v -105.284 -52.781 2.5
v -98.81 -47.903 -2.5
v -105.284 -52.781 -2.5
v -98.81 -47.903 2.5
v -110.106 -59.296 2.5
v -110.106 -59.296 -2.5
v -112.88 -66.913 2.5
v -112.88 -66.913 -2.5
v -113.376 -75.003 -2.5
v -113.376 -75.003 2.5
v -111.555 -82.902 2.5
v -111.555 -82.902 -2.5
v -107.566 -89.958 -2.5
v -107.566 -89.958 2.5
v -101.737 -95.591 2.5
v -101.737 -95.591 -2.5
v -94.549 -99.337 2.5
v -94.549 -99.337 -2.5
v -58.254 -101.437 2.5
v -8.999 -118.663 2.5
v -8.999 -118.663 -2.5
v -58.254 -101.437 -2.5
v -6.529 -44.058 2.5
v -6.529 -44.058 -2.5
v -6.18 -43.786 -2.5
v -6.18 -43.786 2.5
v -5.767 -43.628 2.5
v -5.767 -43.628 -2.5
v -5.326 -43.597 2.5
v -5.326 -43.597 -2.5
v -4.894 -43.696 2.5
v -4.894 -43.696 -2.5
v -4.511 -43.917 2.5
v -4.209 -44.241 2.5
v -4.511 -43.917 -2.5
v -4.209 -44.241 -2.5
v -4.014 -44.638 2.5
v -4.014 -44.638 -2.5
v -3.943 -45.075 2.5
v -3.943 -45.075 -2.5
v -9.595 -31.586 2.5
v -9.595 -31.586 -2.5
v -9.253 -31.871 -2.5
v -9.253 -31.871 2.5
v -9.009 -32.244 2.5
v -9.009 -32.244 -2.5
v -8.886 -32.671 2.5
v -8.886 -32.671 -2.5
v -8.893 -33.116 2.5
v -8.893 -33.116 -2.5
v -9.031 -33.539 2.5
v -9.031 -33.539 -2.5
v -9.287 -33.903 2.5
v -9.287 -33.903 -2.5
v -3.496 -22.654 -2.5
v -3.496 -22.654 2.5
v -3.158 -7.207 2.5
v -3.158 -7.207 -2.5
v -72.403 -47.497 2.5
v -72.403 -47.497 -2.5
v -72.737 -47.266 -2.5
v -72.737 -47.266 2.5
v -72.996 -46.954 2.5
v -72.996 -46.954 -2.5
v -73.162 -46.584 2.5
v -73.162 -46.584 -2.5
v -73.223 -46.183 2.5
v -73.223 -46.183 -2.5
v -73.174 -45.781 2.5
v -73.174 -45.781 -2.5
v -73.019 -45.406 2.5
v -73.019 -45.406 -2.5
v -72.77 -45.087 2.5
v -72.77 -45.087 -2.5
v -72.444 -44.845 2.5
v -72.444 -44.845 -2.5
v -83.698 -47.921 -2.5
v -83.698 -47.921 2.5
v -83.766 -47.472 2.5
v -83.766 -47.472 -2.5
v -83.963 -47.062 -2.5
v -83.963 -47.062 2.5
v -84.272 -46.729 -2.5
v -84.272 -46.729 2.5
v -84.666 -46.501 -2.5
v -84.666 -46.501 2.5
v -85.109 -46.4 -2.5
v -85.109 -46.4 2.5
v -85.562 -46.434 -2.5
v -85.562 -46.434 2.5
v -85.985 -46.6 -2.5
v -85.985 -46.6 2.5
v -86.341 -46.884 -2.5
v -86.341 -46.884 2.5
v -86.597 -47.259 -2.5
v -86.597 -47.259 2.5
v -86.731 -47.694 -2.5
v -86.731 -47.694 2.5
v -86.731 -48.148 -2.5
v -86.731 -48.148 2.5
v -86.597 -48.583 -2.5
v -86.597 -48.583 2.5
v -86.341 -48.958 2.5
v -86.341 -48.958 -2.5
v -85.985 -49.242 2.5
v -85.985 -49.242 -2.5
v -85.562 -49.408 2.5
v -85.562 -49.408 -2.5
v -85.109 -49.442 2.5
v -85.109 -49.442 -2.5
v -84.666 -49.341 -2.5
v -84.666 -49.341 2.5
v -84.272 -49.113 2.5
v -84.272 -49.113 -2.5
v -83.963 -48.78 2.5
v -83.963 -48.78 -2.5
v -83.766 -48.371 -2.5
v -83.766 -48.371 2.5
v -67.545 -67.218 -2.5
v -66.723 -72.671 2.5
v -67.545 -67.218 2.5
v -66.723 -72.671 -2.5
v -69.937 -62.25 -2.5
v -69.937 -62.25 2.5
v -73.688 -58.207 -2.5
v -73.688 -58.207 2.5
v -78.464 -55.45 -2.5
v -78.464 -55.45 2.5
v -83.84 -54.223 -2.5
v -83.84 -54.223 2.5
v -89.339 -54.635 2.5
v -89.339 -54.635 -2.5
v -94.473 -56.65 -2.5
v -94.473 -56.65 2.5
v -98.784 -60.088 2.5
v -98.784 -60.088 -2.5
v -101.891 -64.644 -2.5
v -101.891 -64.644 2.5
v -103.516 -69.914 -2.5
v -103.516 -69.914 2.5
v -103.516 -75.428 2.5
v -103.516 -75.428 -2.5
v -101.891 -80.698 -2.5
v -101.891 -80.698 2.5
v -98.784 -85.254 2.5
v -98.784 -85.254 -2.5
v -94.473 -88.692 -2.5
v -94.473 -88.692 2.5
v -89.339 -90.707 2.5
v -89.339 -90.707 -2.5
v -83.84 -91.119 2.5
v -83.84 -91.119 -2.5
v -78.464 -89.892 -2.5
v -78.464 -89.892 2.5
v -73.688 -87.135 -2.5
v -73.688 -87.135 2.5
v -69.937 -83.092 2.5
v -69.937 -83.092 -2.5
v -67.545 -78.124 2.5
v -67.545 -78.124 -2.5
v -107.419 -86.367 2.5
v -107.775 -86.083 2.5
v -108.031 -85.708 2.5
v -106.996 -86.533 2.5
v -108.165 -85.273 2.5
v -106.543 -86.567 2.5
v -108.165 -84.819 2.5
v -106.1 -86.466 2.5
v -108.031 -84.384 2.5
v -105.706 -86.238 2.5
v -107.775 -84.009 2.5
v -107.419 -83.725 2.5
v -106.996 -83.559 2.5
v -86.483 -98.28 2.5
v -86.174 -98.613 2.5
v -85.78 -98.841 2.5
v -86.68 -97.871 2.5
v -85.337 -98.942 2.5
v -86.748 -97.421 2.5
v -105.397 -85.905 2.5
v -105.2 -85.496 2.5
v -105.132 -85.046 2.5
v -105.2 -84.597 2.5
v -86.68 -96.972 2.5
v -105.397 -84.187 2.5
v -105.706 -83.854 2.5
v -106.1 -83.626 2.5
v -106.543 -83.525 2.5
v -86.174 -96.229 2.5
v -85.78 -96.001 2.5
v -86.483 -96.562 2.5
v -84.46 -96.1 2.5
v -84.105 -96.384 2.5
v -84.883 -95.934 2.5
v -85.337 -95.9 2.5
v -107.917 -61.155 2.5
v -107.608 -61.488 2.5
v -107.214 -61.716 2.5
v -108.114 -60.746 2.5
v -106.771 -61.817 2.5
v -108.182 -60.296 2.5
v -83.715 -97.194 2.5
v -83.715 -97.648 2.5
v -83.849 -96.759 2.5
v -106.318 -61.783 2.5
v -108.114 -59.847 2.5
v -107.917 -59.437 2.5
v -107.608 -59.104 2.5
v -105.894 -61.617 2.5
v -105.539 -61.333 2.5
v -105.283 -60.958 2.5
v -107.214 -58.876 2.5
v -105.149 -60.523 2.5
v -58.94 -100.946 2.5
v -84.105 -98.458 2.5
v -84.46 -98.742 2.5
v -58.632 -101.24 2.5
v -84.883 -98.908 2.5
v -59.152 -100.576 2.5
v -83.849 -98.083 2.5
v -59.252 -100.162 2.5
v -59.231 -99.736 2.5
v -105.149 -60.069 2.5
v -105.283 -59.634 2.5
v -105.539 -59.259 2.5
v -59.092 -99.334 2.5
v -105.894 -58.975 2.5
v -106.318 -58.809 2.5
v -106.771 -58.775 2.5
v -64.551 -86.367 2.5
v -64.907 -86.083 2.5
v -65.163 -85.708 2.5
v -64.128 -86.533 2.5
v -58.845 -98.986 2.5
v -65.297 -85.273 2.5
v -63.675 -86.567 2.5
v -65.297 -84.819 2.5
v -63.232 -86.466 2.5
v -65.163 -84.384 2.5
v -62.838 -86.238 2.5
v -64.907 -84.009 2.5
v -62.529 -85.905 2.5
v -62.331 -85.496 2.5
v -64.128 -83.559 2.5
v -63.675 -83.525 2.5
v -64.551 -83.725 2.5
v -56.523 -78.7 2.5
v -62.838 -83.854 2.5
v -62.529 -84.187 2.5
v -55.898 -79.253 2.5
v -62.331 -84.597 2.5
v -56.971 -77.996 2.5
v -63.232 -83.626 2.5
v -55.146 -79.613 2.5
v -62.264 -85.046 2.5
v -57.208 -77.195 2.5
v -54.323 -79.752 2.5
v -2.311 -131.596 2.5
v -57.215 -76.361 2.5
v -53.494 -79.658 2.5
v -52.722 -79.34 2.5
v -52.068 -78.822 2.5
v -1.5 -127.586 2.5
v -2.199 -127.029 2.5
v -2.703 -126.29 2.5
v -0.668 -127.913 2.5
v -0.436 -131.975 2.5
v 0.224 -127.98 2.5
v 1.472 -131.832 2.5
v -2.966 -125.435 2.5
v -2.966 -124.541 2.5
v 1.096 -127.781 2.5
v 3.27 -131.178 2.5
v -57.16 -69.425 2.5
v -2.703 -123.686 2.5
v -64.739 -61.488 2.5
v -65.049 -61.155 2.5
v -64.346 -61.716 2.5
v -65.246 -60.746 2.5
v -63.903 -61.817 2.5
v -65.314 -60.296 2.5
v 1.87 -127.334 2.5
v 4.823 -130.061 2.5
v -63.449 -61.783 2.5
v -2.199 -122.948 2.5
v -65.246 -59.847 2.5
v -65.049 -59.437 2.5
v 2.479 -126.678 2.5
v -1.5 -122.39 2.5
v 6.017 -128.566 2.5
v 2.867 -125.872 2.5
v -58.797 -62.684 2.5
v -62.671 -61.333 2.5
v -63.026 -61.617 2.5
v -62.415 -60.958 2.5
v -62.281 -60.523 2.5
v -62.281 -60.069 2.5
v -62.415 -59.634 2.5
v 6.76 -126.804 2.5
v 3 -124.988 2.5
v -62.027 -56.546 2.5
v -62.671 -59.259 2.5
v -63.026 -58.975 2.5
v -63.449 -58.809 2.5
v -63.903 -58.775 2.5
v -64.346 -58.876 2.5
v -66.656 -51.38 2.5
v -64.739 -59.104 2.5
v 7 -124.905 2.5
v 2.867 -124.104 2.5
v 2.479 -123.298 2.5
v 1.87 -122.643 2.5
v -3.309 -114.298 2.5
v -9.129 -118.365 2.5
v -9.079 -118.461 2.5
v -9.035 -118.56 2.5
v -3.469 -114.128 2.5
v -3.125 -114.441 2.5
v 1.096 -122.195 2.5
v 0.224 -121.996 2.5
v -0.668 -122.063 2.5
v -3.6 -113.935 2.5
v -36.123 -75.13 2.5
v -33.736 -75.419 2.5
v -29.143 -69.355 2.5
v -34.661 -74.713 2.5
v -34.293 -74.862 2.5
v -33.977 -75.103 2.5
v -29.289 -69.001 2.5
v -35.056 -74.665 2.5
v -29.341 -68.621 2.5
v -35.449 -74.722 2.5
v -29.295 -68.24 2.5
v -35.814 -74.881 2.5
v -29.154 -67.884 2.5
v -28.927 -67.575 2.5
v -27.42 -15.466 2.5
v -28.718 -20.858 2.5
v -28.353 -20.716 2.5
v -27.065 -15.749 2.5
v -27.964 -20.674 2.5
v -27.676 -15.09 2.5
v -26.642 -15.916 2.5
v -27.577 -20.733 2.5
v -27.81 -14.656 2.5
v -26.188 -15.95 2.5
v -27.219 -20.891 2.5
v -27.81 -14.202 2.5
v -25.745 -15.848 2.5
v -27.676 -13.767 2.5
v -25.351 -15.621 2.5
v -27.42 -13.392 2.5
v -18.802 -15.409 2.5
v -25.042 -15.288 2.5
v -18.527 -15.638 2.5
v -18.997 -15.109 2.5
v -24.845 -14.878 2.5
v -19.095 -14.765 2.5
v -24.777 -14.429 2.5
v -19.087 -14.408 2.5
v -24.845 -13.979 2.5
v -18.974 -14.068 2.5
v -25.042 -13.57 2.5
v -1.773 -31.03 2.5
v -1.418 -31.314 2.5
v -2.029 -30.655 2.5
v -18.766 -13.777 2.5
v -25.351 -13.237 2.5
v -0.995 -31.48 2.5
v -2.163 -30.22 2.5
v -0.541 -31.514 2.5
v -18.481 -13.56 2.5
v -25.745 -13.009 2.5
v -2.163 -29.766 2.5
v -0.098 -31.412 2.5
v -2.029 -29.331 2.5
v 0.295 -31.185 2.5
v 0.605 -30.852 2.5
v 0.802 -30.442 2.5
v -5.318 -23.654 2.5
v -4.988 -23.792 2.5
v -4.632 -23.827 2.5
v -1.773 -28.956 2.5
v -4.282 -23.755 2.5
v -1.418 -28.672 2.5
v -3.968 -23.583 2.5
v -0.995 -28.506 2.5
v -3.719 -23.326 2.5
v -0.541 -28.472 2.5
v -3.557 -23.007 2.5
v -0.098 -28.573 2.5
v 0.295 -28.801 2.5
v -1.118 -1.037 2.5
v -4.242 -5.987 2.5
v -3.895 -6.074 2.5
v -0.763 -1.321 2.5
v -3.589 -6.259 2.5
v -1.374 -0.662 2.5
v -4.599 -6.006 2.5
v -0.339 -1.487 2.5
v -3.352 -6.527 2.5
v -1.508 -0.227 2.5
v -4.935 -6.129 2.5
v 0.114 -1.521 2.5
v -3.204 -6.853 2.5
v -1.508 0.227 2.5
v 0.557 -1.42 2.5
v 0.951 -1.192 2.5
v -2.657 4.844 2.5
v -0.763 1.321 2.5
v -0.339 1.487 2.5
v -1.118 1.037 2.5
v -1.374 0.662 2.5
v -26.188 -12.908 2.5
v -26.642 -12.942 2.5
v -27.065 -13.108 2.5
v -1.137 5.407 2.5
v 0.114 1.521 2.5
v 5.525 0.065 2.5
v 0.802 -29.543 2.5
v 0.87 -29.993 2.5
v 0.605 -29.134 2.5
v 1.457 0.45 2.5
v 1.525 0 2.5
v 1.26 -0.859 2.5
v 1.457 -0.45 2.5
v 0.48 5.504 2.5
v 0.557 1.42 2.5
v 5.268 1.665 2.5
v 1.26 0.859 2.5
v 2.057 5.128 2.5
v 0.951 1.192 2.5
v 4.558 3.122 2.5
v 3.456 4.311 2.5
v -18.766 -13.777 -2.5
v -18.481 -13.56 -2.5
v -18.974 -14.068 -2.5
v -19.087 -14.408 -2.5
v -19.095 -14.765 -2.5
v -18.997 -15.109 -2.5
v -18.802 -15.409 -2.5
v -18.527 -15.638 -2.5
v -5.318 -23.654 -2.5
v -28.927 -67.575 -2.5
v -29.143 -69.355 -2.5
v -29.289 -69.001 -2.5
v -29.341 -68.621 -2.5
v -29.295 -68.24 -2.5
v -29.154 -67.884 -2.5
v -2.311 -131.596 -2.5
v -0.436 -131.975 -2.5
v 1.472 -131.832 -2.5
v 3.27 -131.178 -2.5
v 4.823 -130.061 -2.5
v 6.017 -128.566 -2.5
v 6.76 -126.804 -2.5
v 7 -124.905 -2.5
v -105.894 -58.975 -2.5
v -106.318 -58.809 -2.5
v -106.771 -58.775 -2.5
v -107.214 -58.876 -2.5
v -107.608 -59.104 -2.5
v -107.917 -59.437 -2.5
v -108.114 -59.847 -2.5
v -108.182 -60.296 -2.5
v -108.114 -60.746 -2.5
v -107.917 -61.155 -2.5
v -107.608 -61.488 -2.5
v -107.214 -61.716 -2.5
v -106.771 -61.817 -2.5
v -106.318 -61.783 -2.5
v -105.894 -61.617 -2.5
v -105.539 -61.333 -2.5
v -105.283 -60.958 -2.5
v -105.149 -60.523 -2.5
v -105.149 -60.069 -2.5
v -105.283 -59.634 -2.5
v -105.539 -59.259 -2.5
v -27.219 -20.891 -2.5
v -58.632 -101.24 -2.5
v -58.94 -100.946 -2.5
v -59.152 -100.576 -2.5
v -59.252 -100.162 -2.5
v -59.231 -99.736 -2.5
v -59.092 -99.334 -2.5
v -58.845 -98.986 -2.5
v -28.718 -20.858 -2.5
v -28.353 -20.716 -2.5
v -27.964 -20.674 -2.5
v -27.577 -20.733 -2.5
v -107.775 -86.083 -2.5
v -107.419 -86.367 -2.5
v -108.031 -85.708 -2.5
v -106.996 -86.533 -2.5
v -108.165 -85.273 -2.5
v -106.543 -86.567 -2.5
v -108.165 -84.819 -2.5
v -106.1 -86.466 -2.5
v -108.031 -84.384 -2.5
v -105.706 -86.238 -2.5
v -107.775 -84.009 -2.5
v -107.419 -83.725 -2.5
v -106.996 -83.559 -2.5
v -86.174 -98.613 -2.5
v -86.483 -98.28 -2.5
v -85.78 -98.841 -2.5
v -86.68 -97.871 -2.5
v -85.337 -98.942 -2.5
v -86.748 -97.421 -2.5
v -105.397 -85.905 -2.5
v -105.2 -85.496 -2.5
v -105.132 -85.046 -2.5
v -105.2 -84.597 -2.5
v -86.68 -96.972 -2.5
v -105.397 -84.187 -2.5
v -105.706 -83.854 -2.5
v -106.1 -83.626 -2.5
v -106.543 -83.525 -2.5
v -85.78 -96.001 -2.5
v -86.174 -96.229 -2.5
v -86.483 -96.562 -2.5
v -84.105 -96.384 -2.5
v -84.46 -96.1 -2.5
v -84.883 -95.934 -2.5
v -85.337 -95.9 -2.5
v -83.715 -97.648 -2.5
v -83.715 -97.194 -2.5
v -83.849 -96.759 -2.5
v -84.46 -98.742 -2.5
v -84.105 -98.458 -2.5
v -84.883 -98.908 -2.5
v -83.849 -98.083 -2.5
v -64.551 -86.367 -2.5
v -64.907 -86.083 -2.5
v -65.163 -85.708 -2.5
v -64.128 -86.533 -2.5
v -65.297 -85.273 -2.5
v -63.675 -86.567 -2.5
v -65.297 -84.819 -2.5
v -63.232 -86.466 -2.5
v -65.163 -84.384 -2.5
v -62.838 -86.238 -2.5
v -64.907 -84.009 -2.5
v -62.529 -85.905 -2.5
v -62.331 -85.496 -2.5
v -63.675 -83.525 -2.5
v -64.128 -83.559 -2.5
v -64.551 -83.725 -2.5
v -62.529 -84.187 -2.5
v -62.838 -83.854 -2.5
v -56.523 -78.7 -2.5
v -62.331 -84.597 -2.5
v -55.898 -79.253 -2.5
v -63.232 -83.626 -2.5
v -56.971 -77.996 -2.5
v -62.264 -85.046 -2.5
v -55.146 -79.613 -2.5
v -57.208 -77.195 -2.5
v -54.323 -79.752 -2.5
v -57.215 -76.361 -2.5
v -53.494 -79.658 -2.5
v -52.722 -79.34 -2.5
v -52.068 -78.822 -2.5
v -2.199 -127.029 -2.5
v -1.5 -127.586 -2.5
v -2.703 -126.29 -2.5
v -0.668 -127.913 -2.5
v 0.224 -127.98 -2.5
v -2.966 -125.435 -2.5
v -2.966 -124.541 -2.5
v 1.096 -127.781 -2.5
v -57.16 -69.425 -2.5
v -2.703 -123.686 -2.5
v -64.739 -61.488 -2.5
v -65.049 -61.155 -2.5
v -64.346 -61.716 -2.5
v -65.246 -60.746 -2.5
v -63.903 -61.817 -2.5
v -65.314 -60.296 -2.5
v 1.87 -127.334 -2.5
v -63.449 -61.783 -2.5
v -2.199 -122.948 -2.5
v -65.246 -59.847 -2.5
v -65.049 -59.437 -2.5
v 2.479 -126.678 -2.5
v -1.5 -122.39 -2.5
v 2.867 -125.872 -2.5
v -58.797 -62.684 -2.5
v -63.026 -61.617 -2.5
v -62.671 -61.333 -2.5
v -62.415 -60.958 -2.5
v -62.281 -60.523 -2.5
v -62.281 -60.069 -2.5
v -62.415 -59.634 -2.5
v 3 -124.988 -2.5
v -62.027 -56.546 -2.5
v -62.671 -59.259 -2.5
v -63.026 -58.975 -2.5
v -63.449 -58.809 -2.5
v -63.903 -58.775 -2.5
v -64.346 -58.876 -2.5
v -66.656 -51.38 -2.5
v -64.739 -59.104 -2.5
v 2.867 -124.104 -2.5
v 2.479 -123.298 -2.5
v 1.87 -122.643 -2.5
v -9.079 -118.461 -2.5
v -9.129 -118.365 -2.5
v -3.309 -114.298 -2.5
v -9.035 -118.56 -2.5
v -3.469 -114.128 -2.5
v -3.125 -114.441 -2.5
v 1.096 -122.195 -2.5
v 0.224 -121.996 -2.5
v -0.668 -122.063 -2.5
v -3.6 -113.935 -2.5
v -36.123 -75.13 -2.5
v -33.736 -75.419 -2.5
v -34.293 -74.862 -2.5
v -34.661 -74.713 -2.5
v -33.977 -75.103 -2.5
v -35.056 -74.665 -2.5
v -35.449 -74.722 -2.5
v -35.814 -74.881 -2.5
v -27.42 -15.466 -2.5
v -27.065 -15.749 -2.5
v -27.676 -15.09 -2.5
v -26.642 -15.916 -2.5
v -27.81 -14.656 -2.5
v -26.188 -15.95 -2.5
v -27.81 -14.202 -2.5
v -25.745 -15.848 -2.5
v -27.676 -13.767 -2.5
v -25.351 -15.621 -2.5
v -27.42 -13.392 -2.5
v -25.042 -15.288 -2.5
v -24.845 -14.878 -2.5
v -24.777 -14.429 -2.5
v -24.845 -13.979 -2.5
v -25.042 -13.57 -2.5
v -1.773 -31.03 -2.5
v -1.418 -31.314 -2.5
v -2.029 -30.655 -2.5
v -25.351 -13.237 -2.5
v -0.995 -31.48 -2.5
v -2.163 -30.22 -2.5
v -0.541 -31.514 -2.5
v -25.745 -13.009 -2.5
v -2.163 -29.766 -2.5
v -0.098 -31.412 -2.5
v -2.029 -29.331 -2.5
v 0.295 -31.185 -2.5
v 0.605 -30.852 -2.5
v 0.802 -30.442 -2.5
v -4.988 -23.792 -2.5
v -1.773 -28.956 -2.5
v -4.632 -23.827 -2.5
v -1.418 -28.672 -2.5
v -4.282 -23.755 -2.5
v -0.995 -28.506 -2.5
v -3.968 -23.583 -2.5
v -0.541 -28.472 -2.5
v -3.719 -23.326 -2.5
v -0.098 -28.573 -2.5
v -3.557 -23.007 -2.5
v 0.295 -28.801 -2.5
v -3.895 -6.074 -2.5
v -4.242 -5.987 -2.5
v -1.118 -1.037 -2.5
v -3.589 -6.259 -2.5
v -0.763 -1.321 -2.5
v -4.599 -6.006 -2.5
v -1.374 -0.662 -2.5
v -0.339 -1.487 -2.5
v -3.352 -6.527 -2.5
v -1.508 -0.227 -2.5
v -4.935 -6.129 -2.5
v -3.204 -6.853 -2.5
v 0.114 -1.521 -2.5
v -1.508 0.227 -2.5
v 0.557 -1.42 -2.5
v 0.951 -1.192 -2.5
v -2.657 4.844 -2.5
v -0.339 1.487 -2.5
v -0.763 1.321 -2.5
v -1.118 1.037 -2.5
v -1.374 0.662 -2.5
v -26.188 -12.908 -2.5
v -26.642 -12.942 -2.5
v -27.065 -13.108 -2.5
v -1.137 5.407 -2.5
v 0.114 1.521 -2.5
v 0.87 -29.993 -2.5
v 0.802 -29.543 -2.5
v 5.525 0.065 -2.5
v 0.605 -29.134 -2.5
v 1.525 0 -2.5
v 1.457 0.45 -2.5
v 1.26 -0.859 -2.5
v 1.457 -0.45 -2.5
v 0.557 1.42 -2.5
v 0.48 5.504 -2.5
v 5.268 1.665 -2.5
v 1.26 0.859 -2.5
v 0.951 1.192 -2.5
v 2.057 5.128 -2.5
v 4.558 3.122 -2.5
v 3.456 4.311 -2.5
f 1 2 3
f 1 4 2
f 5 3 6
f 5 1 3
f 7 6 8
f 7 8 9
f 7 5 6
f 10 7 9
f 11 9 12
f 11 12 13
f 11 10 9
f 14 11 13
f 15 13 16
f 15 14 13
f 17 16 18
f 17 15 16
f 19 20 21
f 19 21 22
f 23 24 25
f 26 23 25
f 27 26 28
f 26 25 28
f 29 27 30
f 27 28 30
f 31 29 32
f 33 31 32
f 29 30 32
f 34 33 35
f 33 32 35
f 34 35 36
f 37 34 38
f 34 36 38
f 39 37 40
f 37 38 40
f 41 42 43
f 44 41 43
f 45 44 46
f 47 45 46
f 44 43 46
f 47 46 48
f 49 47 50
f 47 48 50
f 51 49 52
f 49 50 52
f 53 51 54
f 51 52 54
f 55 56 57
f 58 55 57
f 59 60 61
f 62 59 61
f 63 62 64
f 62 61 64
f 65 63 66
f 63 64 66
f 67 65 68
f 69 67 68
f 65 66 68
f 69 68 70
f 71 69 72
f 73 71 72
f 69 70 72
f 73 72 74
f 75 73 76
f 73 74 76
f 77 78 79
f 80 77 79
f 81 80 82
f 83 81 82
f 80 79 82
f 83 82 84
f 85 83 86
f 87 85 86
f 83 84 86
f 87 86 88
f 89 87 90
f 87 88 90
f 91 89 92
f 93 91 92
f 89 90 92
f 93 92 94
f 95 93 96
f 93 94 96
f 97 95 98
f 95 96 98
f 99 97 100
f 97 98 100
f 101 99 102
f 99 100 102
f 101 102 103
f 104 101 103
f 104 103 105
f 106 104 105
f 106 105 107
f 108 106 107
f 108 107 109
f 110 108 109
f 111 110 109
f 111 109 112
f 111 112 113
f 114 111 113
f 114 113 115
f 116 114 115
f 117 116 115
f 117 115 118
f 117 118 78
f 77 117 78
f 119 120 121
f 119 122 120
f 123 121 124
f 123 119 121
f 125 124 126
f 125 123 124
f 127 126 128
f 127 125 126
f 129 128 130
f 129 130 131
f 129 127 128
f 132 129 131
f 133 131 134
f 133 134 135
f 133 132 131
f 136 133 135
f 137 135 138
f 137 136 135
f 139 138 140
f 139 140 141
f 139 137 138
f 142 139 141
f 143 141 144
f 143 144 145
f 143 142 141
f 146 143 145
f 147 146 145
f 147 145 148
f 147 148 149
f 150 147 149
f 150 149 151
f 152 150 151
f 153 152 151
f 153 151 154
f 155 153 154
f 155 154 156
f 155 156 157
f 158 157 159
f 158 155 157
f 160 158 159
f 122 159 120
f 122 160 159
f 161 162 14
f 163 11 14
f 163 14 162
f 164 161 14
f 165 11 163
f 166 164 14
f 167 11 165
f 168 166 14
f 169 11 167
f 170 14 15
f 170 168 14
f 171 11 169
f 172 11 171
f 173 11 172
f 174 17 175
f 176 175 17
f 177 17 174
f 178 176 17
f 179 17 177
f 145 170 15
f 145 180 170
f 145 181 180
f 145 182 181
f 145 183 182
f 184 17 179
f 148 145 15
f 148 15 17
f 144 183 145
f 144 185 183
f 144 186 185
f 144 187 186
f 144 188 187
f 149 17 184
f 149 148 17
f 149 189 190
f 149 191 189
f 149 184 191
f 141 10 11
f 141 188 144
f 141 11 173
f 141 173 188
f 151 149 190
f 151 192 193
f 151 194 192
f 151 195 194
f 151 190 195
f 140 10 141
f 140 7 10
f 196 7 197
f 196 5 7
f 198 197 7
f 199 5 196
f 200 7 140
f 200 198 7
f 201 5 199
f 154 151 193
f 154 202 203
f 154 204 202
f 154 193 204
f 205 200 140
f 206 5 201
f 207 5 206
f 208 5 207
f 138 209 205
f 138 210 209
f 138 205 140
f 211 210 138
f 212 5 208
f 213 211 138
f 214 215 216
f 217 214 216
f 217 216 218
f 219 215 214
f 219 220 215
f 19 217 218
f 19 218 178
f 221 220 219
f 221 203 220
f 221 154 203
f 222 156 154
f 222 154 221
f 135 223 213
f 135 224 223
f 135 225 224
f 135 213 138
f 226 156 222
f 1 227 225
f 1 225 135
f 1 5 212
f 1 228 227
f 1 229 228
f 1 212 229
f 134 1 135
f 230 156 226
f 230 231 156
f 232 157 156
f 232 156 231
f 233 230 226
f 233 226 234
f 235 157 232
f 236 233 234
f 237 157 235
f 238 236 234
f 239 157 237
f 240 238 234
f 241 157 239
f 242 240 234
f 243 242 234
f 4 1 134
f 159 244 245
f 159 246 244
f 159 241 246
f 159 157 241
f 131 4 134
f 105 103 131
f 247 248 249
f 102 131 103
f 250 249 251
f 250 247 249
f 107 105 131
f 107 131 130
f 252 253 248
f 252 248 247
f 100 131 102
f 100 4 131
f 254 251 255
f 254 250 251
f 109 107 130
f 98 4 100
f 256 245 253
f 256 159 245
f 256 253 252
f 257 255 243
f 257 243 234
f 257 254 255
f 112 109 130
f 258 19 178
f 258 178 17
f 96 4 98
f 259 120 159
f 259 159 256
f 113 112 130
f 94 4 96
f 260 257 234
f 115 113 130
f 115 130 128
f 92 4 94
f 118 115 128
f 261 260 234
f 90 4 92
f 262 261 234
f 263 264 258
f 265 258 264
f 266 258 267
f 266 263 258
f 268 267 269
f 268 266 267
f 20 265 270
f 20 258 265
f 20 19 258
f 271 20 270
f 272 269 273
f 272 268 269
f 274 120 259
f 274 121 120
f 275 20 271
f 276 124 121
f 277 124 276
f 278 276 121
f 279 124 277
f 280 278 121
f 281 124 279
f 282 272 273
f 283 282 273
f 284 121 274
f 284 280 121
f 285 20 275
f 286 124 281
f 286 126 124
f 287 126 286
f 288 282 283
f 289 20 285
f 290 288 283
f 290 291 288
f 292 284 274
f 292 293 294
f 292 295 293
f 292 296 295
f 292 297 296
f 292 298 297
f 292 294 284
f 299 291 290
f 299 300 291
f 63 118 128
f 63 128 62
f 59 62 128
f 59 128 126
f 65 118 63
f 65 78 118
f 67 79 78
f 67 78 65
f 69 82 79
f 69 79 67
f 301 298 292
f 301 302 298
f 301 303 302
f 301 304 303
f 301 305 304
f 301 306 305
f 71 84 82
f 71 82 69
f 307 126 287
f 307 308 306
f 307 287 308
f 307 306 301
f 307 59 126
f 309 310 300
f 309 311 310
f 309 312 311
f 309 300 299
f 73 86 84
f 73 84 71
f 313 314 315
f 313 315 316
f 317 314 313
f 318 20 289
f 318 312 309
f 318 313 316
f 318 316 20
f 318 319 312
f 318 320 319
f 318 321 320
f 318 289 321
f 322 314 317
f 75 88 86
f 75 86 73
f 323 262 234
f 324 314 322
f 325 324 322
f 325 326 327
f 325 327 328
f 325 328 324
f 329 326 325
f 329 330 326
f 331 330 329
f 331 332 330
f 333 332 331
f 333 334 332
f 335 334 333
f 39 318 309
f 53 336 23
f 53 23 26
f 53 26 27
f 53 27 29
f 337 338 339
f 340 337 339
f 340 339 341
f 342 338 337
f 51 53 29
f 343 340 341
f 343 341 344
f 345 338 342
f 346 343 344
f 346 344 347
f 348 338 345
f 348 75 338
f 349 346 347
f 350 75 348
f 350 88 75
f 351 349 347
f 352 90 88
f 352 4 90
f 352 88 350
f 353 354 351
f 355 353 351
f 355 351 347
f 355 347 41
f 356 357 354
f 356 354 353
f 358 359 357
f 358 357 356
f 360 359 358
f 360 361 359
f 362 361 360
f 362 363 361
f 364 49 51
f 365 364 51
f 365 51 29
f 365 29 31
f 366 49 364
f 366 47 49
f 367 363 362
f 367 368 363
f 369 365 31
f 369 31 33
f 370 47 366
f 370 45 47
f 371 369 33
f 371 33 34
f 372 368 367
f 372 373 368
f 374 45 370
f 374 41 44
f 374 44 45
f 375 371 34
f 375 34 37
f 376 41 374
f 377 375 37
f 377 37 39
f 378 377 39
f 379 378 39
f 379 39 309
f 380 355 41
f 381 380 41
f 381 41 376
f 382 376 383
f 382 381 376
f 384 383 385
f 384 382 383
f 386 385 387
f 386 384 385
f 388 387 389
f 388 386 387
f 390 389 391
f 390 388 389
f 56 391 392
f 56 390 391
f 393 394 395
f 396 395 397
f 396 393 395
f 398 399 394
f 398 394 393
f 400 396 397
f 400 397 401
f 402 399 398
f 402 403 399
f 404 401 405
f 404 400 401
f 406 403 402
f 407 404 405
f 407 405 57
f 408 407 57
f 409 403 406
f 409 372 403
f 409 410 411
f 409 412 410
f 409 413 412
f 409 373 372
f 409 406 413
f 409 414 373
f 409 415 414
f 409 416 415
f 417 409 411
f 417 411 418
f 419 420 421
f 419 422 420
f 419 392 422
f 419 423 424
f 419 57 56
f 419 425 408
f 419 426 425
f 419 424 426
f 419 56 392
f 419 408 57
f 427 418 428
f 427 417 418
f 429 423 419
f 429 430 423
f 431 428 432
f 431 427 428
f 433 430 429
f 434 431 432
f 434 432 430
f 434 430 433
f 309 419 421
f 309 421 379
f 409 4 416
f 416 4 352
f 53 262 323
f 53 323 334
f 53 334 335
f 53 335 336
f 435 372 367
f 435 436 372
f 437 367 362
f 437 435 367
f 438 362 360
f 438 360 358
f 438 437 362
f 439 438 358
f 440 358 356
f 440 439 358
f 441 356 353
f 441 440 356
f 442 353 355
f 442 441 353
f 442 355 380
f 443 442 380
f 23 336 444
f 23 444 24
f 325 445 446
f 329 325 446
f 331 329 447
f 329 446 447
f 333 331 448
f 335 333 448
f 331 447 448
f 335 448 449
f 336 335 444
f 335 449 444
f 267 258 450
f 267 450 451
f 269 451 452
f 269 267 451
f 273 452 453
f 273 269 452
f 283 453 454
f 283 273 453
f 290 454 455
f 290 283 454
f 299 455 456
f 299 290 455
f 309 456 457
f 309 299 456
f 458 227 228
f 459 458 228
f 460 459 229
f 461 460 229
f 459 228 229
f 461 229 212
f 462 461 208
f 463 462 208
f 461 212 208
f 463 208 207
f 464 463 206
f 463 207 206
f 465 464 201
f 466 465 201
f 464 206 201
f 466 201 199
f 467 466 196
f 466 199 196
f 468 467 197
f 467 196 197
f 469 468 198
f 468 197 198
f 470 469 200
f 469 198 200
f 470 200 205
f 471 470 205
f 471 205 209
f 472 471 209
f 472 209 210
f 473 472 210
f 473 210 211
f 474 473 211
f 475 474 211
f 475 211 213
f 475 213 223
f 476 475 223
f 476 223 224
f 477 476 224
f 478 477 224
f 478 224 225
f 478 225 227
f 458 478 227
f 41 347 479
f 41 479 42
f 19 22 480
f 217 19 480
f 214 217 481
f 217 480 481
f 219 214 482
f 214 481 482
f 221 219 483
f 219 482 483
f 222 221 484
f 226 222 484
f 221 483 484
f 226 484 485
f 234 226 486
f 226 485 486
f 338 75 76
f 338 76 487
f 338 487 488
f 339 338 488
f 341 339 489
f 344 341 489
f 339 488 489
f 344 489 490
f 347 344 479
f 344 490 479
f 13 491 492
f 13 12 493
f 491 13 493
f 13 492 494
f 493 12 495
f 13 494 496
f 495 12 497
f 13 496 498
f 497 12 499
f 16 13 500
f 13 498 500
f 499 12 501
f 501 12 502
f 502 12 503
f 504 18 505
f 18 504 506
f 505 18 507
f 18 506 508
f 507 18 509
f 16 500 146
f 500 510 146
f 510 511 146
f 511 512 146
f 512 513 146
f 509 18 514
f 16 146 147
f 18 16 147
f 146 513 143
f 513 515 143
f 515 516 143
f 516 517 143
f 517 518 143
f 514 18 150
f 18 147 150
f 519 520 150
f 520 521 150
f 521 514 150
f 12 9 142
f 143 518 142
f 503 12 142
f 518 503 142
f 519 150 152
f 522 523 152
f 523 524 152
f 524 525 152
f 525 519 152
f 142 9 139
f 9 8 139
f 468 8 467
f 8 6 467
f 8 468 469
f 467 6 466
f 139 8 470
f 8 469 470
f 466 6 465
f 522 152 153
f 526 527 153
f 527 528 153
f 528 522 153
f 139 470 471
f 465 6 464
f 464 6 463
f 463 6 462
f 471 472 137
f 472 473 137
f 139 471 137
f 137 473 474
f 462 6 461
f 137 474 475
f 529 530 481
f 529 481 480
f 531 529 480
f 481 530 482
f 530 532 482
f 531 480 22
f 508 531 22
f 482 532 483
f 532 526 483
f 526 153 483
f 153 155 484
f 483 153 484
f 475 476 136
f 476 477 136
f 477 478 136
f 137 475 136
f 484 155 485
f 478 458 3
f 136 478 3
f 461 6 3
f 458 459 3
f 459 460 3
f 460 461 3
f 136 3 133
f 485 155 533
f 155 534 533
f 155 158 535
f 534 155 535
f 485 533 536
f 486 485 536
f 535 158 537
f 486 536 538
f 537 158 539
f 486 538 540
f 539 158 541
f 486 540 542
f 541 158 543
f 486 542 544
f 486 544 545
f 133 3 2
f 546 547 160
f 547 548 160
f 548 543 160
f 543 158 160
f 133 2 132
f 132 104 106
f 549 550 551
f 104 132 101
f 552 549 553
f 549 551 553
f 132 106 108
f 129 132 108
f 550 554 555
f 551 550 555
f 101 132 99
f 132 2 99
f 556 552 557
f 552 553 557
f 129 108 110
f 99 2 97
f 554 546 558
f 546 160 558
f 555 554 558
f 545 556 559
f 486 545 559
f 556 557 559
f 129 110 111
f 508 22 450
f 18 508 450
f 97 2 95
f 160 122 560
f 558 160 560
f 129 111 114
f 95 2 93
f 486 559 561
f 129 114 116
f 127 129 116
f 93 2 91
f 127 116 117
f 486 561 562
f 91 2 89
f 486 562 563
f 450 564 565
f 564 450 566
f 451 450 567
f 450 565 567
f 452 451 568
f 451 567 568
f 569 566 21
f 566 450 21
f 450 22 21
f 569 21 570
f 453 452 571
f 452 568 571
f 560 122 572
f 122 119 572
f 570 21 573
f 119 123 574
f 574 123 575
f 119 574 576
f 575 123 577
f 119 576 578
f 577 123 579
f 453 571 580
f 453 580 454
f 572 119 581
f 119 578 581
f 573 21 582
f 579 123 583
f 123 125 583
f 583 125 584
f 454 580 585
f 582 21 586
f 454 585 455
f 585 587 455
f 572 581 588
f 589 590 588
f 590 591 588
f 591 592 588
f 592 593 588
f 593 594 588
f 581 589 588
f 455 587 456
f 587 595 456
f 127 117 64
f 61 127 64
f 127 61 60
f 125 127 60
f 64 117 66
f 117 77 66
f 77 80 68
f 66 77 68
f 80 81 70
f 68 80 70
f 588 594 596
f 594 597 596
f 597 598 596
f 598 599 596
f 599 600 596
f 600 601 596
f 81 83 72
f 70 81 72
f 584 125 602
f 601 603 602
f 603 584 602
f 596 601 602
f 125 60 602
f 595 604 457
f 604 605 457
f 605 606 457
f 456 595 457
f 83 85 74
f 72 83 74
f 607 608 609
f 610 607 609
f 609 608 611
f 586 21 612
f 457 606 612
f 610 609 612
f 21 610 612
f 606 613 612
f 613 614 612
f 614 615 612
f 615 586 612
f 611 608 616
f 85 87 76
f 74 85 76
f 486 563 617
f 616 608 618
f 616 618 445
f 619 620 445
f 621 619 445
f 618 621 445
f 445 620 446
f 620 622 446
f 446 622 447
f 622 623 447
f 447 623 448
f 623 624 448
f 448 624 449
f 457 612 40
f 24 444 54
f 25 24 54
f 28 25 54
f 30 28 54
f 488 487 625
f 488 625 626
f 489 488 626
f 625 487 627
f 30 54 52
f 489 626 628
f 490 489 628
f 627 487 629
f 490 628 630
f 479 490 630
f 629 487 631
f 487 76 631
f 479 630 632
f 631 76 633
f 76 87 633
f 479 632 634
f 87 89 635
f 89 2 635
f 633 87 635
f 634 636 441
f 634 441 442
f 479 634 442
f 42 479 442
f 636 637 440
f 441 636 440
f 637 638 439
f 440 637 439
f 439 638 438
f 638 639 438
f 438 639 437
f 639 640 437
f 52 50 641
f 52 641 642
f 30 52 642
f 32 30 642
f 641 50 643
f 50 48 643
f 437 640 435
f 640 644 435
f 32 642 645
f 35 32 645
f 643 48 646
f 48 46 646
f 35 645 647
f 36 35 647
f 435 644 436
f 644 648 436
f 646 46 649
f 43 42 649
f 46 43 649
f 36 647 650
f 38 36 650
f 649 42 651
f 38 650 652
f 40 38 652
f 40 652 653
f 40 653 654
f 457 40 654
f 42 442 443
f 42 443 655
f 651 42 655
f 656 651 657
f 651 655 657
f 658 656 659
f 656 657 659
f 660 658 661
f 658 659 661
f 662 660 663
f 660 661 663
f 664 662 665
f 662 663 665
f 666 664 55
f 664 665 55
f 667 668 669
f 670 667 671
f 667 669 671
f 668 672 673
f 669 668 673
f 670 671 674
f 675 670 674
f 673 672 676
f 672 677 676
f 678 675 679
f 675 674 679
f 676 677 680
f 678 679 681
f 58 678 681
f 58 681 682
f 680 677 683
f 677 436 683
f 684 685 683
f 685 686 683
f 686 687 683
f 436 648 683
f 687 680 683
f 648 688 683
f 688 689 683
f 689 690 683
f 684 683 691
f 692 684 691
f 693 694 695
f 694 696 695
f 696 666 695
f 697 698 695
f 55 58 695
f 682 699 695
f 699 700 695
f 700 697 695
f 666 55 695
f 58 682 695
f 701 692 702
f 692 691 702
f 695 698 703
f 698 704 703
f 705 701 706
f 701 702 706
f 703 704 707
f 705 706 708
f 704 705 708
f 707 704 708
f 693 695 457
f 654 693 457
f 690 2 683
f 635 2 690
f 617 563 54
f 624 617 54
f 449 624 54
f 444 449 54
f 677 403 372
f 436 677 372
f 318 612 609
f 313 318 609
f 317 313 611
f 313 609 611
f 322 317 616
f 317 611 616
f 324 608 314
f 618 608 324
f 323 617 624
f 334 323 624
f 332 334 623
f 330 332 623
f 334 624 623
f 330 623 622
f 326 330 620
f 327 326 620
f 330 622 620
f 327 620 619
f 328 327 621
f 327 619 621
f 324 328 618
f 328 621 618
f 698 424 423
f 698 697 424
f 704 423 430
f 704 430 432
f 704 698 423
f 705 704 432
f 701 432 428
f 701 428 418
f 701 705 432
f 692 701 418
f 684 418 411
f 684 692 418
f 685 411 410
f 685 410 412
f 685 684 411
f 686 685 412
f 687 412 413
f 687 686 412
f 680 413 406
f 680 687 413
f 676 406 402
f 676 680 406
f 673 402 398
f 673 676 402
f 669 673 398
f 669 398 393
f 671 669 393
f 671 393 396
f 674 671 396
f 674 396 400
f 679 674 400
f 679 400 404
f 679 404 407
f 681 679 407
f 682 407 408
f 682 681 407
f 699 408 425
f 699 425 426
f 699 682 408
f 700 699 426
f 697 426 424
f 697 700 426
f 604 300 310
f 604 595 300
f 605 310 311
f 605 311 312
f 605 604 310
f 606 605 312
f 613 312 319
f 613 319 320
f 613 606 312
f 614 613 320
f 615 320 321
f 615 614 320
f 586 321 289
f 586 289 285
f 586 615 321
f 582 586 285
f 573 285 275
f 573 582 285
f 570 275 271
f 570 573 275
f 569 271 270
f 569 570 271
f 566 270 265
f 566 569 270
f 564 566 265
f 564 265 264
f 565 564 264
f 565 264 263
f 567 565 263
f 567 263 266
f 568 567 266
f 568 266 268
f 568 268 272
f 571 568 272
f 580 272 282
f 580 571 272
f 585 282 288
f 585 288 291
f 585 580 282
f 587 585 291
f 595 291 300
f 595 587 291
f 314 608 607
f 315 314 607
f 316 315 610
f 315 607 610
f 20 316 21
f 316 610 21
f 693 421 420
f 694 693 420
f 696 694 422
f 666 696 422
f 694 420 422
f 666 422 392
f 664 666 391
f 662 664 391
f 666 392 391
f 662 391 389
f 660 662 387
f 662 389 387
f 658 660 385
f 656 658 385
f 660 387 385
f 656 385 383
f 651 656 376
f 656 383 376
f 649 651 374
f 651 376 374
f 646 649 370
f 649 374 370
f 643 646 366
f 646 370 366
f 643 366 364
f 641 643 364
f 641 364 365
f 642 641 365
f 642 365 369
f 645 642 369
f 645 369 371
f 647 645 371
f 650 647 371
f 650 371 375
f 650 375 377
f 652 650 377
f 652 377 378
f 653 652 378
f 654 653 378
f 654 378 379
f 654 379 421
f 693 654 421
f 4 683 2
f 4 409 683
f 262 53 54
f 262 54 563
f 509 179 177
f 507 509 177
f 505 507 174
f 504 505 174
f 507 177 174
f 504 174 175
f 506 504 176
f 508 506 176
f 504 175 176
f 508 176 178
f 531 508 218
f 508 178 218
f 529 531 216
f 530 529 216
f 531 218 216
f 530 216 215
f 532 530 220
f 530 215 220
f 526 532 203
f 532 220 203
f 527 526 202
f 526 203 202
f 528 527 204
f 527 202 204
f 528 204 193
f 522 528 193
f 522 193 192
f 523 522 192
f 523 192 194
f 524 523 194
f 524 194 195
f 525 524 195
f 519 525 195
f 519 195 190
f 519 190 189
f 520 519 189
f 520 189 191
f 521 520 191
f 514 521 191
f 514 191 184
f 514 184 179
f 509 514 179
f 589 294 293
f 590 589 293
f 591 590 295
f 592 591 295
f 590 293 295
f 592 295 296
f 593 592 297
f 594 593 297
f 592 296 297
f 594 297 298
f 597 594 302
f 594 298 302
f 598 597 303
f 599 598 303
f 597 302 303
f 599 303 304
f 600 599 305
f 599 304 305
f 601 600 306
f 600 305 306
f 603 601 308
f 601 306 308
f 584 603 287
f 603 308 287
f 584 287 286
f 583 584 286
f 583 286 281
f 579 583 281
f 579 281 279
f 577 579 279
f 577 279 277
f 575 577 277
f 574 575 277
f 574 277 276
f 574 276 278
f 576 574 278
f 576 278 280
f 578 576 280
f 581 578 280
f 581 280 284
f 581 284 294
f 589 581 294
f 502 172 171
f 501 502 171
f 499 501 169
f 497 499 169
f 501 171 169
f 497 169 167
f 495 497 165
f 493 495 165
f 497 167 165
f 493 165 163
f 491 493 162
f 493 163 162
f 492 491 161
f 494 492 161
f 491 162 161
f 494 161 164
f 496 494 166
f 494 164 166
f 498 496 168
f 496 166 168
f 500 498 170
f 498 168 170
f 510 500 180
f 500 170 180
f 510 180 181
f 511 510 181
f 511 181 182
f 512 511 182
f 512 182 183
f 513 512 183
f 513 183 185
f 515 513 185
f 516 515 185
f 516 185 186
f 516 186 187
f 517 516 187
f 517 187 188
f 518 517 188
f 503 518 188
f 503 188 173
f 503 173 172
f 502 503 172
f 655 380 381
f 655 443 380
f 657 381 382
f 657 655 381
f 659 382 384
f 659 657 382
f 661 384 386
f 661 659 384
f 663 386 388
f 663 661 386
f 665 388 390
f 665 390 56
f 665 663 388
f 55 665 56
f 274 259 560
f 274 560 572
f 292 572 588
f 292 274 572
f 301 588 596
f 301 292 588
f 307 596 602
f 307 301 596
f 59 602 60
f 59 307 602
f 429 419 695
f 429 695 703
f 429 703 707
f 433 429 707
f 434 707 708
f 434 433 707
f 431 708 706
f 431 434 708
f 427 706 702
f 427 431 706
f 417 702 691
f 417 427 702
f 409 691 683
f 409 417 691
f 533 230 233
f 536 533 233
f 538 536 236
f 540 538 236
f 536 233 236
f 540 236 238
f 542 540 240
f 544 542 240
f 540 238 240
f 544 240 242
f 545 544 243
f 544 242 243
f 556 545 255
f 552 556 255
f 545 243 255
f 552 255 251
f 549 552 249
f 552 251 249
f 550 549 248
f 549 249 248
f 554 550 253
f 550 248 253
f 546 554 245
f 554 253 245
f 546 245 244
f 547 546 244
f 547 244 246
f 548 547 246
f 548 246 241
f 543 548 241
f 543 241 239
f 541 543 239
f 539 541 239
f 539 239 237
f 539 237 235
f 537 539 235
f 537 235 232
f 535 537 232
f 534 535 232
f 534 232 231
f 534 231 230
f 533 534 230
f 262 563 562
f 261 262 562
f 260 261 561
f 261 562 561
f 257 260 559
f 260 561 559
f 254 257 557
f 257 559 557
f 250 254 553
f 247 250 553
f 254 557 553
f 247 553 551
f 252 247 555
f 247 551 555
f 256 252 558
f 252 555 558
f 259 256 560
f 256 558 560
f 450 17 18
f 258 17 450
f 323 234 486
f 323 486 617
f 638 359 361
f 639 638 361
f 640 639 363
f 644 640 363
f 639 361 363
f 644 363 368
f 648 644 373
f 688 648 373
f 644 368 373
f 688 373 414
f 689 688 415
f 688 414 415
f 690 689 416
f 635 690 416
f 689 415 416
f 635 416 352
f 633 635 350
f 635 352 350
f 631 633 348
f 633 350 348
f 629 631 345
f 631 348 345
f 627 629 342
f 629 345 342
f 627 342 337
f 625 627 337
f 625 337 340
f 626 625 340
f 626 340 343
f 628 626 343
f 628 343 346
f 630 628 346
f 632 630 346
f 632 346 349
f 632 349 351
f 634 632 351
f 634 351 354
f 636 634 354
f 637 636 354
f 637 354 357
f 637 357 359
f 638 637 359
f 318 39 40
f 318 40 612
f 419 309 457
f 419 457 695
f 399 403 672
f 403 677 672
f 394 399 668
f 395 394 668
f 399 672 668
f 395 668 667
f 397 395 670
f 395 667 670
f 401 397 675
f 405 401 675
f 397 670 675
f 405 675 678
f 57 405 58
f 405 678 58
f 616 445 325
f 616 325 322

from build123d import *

# Parameters (mm, degrees)
SKETCH_1_R               = 18.5
SKETCH_1_R_2             = 1.525
SKETCH_1_R_3             = 3
EXTRUDE_1_DEPTH          = 2.5
SKETCH_4_R               = 1.525
CUT_EXTRUDE_3_DEPTH      = 10
PATTERN_CIRCULAR_2_COUNT = 6
SKETCH_5_R               = 1.525
CUT_EXTRUDE_4_DEPTH      = 31.54
CUT_EXTRUDE_5_DEPTH      = 31.54
EXTRUDE_2_DEPTH          = 5
EXTRUDE_3_DEPTH          = 5
FILLET_START             = -2.5
FILLET_2_DEPTH           = 5
CUT_EXTRUDE_7_DEPTH      = 5
FILLET_4_R               = 1.2


with BuildPart() as part:
    # 草图1 → 凸台-拉伸1 (new, symmetric)
    with BuildSketch(Plane.XY):
        with BuildLine():
            Line((-94.548784095, -99.337249729), (-2.310865067, -131.595640783))
            ThreePointArc((-2.310865067, -131.595640783), (4.084783214, -130.672665207), (6.99951255, -124.905468856))
            Line((6.99951255, -124.905468856), (5.524615263, 0.065201219))
            ThreePointArc((5.524615263, 0.065201219), (2.786503665, 4.770851321), (-2.657304464, 4.84400227))
            Line((-2.657304464, 4.84400227), (-98.809915302, -47.903033704))
            ThreePointArc((-98.809915302, -47.903033704), (-113.376342219, -75.003424702), (-94.548784095, -99.337249729))
        make_face()
        with Locations((-85.222792931, -72.671009109)):
            Circle(SKETCH_1_R, mode=Mode.SUBTRACT)
        Circle(SKETCH_1_R_2, mode=Mode.SUBTRACT)
        with Locations((0, -124.988076735)):
            Circle(SKETCH_1_R_3, mode=Mode.SUBTRACT)
    extrude(amount=EXTRUDE_1_DEPTH, both=True)

    # 草图4 → 切除-拉伸3 (cut)
    with BuildSketch(Plane.XY.offset(2.5)):
        with Locations((-85.222792931, -47.921009109)):
            Circle(SKETCH_4_R)
    cut_extrude_3 = extrude(amount=-CUT_EXTRUDE_3_DEPTH, mode=Mode.SUBTRACT)

    # 阵列(圆周)2: 切除-拉伸3 ×6 about axis
    pattern_circular_2_axis = Axis((-85.222792931, -72.671009109, 0), (0, 0, 1))
    for i in range(1, PATTERN_CIRCULAR_2_COUNT):
        add(cut_extrude_3.rotate(pattern_circular_2_axis, i * 360 / PATTERN_CIRCULAR_2_COUNT), mode=Mode.SUBTRACT)

    # 草图5 → 切除-拉伸4 (cut)
    with BuildSketch(Plane.XY.offset(2.5)):
        with Locations((-0.655427857, -29.992839384)):
            Circle(SKETCH_5_R)
        with Locations((-26.302274767, -14.428802517)):
            Circle(SKETCH_5_R)
    extrude(amount=-CUT_EXTRUDE_4_DEPTH, mode=Mode.SUBTRACT)

    # 草图6 → 切除-拉伸5 (cut)
    with BuildSketch(Plane.XY.offset(2.5)):
        with BuildLine():
            Line((-75.094363285, -46.299103359), (-27.959039434, -20.441785485))
            Line((-27.959039434, -20.441785485), (-4.062911687, -34.943381511))
            Line((-4.062911687, -34.943381511), (-3.124682468, -114.441211823))
            ThreePointArc((-3.124682468, -114.441211823), (-6.418945051, -116.055151994), (-8.999327109, -118.662563983))
            Line((-8.999327109, -118.662563983), (-70.892608691, -97.016610758))
            ThreePointArc((-70.892608691, -97.016610758), (-57.069243644, -70.338593517), (-75.094363285, -46.299103359))
        make_face()
    extrude(amount=-CUT_EXTRUDE_5_DEPTH, mode=Mode.SUBTRACT)

    # 草图7 → 凸台-拉伸2 (add)
    with BuildSketch(Plane.XY.offset(2.5)):
        with BuildLine():
            Line((-65.109328248, -99.039198909), (-60.447667843, -100.669522597))
            Line((-60.447667843, -100.669522597), (-3.986848357, -41.388362786))
            Line((-3.986848357, -41.388362786), (-4.062911687, -34.943381511))
            Line((-4.062911687, -34.943381511), (-8.001104314, -32.553451262))
            Line((-8.001104314, -32.553451262), (-64.766339632, -92.154233135))
            ThreePointArc((-64.766339632, -92.154233135), (-67.660383733, -94.798464524), (-70.892608691, -97.016610758))
            Line((-70.892608691, -97.016610758), (-65.109328248, -99.039198909))
        make_face()
    extrude(amount=-EXTRUDE_2_DEPTH)

    # 草图8 → 凸台-拉伸3 (add)
    with BuildSketch(Plane(origin=(0, 0, -2.5), x_dir=(-1, 0, 0), z_dir=(0, 0, -1))):
        Polygon((8.398824834, -119.639882413), (35.254100893, -72.768938625), (29.6986281, -68.384501663), (2.325139246, -116.159890547), align=None)
    extrude(amount=-EXTRUDE_3_DEPTH)

    # 圆角2: read off the stored shape, not the designer's step
    # 圆角2 outline → 圆角2 (add)
    with BuildSketch(Plane.XY.offset(FILLET_START)):
        with BuildLine():
            ThreePointArc((-52.068137932, -78.821728734), (-55.534618391, -79.459237326), (-57.214804329, -76.360870144))
            ThreePointArc((-57.214804329, -76.360870144), (-59.736362996, -84.857246804), (-64.766339632, -92.154233135))
            Line((-64.766339632, -92.154233135), (-52.068137932, -78.821728734))
        make_face()
        with BuildLine():
            ThreePointArc((-75.094363285, -46.299103359), (-73.733280759, -46.862994656), (-72.403446669, -47.497076929))
            ThreePointArc((-72.403446669, -47.497076929), (-73.222596192, -46.183465315), (-72.444213542, -44.845294226))
            Line((-72.444213542, -44.845294226), (-75.094363285, -46.299103359))
        make_face()
        with BuildLine():
            ThreePointArc((-9.594656237, -31.586388879), (-8.885938003, -32.671073224), (-9.286674719, -33.903238695))
            Line((-9.286674719, -33.903238695), (-8.001104314, -32.553451262))
            Line((-8.001104314, -32.553451262), (-9.594656237, -31.586388879))
        make_face()
        with BuildLine():
            Line((-27.959039434, -20.441785485), (-28.718320704, -20.858309136))
            ThreePointArc((-28.718320704, -20.858309136), (-27.964109185, -20.673780905), (-27.218678735, -20.891080529))
            Line((-27.218678735, -20.891080529), (-27.959039434, -20.441785485))
        make_face()
        with BuildLine():
            ThreePointArc((-6.52942074, -44.057942172), (-4.894363129, -43.696477917), (-3.943341833, -45.074747954))
            Line((-3.943341833, -45.074747954), (-3.986848357, -41.388362786))
            Line((-3.986848357, -41.388362786), (-6.52942074, -44.057942172))
        make_face()
        with BuildLine():
            ThreePointArc((-3.282371439, -114.489217858), (-3.203616876, -114.464919466), (-3.124682468, -114.441211823))
            ThreePointArc((-3.124682468, -114.441211823), (-3.391983975, -114.215991533), (-3.599904234, -113.93502278))
            Line((-3.599904234, -113.93502278), (-3.282371439, -114.489217858))
        make_face()
        with BuildLine():
            ThreePointArc((-29.142637234, -69.354881433), (-29.330280124, -68.429053989), (-28.927316541, -67.57466142))
            Line((-28.927316541, -67.57466142), (-29.6986281, -68.384501663))
            Line((-29.6986281, -68.384501663), (-29.142637234, -69.354881433))
        make_face()
        with BuildLine():
            ThreePointArc((-36.123402256, -75.130207215), (-34.857103993, -74.675567741), (-33.73571484, -75.419002143))
            Line((-33.73571484, -75.419002143), (-34.7358881, -73.67338372))
            Line((-34.7358881, -73.67338372), (-36.123402256, -75.130207215))
        make_face()
        with BuildLine():
            Line((-8.976957664, -118.630857917), (-9.129347243, -118.364889943))
            ThreePointArc((-9.129347243, -118.364889943), (-9.05625561, -118.510197041), (-8.999327109, -118.662563983))
            ThreePointArc((-8.999327109, -118.662563983), (-8.988156367, -118.646701086), (-8.976957664, -118.630857917))
        make_face()
        with BuildLine():
            ThreePointArc((-58.2536461, -101.436838383), (-59.216649338, -100.372621972), (-58.844644089, -98.986424331))
            Line((-58.844644089, -98.986424331), (-60.447667843, -100.669522597))
            Line((-60.447667843, -100.669522597), (-58.2536461, -101.436838383))
        make_face()
    extrude(amount=FILLET_2_DEPTH)

    # 草图12 → 切除-拉伸7 (cut)
    with BuildSketch(Plane.XY.offset(2.5)):
        Polygon((-3.112807373, -5.129369382), (-20.30370689, -14.559888089), (-3.541188361, -24.732384431), align=None)
    extrude(amount=-CUT_EXTRUDE_7_DEPTH, mode=Mode.SUBTRACT)

    # 圆角4
    fillet_4_edges = [part.edges().sort_by_distance(p)[0] for p in [
        (-3.112807373, -5.129369382, 0),
        (-3.541188361, -24.732384431, 0),
        (-20.30370689, -14.559888089, 0),
    ]]
    fillet(fillet_4_edges, radius=FILLET_4_R)


solid = part.part
